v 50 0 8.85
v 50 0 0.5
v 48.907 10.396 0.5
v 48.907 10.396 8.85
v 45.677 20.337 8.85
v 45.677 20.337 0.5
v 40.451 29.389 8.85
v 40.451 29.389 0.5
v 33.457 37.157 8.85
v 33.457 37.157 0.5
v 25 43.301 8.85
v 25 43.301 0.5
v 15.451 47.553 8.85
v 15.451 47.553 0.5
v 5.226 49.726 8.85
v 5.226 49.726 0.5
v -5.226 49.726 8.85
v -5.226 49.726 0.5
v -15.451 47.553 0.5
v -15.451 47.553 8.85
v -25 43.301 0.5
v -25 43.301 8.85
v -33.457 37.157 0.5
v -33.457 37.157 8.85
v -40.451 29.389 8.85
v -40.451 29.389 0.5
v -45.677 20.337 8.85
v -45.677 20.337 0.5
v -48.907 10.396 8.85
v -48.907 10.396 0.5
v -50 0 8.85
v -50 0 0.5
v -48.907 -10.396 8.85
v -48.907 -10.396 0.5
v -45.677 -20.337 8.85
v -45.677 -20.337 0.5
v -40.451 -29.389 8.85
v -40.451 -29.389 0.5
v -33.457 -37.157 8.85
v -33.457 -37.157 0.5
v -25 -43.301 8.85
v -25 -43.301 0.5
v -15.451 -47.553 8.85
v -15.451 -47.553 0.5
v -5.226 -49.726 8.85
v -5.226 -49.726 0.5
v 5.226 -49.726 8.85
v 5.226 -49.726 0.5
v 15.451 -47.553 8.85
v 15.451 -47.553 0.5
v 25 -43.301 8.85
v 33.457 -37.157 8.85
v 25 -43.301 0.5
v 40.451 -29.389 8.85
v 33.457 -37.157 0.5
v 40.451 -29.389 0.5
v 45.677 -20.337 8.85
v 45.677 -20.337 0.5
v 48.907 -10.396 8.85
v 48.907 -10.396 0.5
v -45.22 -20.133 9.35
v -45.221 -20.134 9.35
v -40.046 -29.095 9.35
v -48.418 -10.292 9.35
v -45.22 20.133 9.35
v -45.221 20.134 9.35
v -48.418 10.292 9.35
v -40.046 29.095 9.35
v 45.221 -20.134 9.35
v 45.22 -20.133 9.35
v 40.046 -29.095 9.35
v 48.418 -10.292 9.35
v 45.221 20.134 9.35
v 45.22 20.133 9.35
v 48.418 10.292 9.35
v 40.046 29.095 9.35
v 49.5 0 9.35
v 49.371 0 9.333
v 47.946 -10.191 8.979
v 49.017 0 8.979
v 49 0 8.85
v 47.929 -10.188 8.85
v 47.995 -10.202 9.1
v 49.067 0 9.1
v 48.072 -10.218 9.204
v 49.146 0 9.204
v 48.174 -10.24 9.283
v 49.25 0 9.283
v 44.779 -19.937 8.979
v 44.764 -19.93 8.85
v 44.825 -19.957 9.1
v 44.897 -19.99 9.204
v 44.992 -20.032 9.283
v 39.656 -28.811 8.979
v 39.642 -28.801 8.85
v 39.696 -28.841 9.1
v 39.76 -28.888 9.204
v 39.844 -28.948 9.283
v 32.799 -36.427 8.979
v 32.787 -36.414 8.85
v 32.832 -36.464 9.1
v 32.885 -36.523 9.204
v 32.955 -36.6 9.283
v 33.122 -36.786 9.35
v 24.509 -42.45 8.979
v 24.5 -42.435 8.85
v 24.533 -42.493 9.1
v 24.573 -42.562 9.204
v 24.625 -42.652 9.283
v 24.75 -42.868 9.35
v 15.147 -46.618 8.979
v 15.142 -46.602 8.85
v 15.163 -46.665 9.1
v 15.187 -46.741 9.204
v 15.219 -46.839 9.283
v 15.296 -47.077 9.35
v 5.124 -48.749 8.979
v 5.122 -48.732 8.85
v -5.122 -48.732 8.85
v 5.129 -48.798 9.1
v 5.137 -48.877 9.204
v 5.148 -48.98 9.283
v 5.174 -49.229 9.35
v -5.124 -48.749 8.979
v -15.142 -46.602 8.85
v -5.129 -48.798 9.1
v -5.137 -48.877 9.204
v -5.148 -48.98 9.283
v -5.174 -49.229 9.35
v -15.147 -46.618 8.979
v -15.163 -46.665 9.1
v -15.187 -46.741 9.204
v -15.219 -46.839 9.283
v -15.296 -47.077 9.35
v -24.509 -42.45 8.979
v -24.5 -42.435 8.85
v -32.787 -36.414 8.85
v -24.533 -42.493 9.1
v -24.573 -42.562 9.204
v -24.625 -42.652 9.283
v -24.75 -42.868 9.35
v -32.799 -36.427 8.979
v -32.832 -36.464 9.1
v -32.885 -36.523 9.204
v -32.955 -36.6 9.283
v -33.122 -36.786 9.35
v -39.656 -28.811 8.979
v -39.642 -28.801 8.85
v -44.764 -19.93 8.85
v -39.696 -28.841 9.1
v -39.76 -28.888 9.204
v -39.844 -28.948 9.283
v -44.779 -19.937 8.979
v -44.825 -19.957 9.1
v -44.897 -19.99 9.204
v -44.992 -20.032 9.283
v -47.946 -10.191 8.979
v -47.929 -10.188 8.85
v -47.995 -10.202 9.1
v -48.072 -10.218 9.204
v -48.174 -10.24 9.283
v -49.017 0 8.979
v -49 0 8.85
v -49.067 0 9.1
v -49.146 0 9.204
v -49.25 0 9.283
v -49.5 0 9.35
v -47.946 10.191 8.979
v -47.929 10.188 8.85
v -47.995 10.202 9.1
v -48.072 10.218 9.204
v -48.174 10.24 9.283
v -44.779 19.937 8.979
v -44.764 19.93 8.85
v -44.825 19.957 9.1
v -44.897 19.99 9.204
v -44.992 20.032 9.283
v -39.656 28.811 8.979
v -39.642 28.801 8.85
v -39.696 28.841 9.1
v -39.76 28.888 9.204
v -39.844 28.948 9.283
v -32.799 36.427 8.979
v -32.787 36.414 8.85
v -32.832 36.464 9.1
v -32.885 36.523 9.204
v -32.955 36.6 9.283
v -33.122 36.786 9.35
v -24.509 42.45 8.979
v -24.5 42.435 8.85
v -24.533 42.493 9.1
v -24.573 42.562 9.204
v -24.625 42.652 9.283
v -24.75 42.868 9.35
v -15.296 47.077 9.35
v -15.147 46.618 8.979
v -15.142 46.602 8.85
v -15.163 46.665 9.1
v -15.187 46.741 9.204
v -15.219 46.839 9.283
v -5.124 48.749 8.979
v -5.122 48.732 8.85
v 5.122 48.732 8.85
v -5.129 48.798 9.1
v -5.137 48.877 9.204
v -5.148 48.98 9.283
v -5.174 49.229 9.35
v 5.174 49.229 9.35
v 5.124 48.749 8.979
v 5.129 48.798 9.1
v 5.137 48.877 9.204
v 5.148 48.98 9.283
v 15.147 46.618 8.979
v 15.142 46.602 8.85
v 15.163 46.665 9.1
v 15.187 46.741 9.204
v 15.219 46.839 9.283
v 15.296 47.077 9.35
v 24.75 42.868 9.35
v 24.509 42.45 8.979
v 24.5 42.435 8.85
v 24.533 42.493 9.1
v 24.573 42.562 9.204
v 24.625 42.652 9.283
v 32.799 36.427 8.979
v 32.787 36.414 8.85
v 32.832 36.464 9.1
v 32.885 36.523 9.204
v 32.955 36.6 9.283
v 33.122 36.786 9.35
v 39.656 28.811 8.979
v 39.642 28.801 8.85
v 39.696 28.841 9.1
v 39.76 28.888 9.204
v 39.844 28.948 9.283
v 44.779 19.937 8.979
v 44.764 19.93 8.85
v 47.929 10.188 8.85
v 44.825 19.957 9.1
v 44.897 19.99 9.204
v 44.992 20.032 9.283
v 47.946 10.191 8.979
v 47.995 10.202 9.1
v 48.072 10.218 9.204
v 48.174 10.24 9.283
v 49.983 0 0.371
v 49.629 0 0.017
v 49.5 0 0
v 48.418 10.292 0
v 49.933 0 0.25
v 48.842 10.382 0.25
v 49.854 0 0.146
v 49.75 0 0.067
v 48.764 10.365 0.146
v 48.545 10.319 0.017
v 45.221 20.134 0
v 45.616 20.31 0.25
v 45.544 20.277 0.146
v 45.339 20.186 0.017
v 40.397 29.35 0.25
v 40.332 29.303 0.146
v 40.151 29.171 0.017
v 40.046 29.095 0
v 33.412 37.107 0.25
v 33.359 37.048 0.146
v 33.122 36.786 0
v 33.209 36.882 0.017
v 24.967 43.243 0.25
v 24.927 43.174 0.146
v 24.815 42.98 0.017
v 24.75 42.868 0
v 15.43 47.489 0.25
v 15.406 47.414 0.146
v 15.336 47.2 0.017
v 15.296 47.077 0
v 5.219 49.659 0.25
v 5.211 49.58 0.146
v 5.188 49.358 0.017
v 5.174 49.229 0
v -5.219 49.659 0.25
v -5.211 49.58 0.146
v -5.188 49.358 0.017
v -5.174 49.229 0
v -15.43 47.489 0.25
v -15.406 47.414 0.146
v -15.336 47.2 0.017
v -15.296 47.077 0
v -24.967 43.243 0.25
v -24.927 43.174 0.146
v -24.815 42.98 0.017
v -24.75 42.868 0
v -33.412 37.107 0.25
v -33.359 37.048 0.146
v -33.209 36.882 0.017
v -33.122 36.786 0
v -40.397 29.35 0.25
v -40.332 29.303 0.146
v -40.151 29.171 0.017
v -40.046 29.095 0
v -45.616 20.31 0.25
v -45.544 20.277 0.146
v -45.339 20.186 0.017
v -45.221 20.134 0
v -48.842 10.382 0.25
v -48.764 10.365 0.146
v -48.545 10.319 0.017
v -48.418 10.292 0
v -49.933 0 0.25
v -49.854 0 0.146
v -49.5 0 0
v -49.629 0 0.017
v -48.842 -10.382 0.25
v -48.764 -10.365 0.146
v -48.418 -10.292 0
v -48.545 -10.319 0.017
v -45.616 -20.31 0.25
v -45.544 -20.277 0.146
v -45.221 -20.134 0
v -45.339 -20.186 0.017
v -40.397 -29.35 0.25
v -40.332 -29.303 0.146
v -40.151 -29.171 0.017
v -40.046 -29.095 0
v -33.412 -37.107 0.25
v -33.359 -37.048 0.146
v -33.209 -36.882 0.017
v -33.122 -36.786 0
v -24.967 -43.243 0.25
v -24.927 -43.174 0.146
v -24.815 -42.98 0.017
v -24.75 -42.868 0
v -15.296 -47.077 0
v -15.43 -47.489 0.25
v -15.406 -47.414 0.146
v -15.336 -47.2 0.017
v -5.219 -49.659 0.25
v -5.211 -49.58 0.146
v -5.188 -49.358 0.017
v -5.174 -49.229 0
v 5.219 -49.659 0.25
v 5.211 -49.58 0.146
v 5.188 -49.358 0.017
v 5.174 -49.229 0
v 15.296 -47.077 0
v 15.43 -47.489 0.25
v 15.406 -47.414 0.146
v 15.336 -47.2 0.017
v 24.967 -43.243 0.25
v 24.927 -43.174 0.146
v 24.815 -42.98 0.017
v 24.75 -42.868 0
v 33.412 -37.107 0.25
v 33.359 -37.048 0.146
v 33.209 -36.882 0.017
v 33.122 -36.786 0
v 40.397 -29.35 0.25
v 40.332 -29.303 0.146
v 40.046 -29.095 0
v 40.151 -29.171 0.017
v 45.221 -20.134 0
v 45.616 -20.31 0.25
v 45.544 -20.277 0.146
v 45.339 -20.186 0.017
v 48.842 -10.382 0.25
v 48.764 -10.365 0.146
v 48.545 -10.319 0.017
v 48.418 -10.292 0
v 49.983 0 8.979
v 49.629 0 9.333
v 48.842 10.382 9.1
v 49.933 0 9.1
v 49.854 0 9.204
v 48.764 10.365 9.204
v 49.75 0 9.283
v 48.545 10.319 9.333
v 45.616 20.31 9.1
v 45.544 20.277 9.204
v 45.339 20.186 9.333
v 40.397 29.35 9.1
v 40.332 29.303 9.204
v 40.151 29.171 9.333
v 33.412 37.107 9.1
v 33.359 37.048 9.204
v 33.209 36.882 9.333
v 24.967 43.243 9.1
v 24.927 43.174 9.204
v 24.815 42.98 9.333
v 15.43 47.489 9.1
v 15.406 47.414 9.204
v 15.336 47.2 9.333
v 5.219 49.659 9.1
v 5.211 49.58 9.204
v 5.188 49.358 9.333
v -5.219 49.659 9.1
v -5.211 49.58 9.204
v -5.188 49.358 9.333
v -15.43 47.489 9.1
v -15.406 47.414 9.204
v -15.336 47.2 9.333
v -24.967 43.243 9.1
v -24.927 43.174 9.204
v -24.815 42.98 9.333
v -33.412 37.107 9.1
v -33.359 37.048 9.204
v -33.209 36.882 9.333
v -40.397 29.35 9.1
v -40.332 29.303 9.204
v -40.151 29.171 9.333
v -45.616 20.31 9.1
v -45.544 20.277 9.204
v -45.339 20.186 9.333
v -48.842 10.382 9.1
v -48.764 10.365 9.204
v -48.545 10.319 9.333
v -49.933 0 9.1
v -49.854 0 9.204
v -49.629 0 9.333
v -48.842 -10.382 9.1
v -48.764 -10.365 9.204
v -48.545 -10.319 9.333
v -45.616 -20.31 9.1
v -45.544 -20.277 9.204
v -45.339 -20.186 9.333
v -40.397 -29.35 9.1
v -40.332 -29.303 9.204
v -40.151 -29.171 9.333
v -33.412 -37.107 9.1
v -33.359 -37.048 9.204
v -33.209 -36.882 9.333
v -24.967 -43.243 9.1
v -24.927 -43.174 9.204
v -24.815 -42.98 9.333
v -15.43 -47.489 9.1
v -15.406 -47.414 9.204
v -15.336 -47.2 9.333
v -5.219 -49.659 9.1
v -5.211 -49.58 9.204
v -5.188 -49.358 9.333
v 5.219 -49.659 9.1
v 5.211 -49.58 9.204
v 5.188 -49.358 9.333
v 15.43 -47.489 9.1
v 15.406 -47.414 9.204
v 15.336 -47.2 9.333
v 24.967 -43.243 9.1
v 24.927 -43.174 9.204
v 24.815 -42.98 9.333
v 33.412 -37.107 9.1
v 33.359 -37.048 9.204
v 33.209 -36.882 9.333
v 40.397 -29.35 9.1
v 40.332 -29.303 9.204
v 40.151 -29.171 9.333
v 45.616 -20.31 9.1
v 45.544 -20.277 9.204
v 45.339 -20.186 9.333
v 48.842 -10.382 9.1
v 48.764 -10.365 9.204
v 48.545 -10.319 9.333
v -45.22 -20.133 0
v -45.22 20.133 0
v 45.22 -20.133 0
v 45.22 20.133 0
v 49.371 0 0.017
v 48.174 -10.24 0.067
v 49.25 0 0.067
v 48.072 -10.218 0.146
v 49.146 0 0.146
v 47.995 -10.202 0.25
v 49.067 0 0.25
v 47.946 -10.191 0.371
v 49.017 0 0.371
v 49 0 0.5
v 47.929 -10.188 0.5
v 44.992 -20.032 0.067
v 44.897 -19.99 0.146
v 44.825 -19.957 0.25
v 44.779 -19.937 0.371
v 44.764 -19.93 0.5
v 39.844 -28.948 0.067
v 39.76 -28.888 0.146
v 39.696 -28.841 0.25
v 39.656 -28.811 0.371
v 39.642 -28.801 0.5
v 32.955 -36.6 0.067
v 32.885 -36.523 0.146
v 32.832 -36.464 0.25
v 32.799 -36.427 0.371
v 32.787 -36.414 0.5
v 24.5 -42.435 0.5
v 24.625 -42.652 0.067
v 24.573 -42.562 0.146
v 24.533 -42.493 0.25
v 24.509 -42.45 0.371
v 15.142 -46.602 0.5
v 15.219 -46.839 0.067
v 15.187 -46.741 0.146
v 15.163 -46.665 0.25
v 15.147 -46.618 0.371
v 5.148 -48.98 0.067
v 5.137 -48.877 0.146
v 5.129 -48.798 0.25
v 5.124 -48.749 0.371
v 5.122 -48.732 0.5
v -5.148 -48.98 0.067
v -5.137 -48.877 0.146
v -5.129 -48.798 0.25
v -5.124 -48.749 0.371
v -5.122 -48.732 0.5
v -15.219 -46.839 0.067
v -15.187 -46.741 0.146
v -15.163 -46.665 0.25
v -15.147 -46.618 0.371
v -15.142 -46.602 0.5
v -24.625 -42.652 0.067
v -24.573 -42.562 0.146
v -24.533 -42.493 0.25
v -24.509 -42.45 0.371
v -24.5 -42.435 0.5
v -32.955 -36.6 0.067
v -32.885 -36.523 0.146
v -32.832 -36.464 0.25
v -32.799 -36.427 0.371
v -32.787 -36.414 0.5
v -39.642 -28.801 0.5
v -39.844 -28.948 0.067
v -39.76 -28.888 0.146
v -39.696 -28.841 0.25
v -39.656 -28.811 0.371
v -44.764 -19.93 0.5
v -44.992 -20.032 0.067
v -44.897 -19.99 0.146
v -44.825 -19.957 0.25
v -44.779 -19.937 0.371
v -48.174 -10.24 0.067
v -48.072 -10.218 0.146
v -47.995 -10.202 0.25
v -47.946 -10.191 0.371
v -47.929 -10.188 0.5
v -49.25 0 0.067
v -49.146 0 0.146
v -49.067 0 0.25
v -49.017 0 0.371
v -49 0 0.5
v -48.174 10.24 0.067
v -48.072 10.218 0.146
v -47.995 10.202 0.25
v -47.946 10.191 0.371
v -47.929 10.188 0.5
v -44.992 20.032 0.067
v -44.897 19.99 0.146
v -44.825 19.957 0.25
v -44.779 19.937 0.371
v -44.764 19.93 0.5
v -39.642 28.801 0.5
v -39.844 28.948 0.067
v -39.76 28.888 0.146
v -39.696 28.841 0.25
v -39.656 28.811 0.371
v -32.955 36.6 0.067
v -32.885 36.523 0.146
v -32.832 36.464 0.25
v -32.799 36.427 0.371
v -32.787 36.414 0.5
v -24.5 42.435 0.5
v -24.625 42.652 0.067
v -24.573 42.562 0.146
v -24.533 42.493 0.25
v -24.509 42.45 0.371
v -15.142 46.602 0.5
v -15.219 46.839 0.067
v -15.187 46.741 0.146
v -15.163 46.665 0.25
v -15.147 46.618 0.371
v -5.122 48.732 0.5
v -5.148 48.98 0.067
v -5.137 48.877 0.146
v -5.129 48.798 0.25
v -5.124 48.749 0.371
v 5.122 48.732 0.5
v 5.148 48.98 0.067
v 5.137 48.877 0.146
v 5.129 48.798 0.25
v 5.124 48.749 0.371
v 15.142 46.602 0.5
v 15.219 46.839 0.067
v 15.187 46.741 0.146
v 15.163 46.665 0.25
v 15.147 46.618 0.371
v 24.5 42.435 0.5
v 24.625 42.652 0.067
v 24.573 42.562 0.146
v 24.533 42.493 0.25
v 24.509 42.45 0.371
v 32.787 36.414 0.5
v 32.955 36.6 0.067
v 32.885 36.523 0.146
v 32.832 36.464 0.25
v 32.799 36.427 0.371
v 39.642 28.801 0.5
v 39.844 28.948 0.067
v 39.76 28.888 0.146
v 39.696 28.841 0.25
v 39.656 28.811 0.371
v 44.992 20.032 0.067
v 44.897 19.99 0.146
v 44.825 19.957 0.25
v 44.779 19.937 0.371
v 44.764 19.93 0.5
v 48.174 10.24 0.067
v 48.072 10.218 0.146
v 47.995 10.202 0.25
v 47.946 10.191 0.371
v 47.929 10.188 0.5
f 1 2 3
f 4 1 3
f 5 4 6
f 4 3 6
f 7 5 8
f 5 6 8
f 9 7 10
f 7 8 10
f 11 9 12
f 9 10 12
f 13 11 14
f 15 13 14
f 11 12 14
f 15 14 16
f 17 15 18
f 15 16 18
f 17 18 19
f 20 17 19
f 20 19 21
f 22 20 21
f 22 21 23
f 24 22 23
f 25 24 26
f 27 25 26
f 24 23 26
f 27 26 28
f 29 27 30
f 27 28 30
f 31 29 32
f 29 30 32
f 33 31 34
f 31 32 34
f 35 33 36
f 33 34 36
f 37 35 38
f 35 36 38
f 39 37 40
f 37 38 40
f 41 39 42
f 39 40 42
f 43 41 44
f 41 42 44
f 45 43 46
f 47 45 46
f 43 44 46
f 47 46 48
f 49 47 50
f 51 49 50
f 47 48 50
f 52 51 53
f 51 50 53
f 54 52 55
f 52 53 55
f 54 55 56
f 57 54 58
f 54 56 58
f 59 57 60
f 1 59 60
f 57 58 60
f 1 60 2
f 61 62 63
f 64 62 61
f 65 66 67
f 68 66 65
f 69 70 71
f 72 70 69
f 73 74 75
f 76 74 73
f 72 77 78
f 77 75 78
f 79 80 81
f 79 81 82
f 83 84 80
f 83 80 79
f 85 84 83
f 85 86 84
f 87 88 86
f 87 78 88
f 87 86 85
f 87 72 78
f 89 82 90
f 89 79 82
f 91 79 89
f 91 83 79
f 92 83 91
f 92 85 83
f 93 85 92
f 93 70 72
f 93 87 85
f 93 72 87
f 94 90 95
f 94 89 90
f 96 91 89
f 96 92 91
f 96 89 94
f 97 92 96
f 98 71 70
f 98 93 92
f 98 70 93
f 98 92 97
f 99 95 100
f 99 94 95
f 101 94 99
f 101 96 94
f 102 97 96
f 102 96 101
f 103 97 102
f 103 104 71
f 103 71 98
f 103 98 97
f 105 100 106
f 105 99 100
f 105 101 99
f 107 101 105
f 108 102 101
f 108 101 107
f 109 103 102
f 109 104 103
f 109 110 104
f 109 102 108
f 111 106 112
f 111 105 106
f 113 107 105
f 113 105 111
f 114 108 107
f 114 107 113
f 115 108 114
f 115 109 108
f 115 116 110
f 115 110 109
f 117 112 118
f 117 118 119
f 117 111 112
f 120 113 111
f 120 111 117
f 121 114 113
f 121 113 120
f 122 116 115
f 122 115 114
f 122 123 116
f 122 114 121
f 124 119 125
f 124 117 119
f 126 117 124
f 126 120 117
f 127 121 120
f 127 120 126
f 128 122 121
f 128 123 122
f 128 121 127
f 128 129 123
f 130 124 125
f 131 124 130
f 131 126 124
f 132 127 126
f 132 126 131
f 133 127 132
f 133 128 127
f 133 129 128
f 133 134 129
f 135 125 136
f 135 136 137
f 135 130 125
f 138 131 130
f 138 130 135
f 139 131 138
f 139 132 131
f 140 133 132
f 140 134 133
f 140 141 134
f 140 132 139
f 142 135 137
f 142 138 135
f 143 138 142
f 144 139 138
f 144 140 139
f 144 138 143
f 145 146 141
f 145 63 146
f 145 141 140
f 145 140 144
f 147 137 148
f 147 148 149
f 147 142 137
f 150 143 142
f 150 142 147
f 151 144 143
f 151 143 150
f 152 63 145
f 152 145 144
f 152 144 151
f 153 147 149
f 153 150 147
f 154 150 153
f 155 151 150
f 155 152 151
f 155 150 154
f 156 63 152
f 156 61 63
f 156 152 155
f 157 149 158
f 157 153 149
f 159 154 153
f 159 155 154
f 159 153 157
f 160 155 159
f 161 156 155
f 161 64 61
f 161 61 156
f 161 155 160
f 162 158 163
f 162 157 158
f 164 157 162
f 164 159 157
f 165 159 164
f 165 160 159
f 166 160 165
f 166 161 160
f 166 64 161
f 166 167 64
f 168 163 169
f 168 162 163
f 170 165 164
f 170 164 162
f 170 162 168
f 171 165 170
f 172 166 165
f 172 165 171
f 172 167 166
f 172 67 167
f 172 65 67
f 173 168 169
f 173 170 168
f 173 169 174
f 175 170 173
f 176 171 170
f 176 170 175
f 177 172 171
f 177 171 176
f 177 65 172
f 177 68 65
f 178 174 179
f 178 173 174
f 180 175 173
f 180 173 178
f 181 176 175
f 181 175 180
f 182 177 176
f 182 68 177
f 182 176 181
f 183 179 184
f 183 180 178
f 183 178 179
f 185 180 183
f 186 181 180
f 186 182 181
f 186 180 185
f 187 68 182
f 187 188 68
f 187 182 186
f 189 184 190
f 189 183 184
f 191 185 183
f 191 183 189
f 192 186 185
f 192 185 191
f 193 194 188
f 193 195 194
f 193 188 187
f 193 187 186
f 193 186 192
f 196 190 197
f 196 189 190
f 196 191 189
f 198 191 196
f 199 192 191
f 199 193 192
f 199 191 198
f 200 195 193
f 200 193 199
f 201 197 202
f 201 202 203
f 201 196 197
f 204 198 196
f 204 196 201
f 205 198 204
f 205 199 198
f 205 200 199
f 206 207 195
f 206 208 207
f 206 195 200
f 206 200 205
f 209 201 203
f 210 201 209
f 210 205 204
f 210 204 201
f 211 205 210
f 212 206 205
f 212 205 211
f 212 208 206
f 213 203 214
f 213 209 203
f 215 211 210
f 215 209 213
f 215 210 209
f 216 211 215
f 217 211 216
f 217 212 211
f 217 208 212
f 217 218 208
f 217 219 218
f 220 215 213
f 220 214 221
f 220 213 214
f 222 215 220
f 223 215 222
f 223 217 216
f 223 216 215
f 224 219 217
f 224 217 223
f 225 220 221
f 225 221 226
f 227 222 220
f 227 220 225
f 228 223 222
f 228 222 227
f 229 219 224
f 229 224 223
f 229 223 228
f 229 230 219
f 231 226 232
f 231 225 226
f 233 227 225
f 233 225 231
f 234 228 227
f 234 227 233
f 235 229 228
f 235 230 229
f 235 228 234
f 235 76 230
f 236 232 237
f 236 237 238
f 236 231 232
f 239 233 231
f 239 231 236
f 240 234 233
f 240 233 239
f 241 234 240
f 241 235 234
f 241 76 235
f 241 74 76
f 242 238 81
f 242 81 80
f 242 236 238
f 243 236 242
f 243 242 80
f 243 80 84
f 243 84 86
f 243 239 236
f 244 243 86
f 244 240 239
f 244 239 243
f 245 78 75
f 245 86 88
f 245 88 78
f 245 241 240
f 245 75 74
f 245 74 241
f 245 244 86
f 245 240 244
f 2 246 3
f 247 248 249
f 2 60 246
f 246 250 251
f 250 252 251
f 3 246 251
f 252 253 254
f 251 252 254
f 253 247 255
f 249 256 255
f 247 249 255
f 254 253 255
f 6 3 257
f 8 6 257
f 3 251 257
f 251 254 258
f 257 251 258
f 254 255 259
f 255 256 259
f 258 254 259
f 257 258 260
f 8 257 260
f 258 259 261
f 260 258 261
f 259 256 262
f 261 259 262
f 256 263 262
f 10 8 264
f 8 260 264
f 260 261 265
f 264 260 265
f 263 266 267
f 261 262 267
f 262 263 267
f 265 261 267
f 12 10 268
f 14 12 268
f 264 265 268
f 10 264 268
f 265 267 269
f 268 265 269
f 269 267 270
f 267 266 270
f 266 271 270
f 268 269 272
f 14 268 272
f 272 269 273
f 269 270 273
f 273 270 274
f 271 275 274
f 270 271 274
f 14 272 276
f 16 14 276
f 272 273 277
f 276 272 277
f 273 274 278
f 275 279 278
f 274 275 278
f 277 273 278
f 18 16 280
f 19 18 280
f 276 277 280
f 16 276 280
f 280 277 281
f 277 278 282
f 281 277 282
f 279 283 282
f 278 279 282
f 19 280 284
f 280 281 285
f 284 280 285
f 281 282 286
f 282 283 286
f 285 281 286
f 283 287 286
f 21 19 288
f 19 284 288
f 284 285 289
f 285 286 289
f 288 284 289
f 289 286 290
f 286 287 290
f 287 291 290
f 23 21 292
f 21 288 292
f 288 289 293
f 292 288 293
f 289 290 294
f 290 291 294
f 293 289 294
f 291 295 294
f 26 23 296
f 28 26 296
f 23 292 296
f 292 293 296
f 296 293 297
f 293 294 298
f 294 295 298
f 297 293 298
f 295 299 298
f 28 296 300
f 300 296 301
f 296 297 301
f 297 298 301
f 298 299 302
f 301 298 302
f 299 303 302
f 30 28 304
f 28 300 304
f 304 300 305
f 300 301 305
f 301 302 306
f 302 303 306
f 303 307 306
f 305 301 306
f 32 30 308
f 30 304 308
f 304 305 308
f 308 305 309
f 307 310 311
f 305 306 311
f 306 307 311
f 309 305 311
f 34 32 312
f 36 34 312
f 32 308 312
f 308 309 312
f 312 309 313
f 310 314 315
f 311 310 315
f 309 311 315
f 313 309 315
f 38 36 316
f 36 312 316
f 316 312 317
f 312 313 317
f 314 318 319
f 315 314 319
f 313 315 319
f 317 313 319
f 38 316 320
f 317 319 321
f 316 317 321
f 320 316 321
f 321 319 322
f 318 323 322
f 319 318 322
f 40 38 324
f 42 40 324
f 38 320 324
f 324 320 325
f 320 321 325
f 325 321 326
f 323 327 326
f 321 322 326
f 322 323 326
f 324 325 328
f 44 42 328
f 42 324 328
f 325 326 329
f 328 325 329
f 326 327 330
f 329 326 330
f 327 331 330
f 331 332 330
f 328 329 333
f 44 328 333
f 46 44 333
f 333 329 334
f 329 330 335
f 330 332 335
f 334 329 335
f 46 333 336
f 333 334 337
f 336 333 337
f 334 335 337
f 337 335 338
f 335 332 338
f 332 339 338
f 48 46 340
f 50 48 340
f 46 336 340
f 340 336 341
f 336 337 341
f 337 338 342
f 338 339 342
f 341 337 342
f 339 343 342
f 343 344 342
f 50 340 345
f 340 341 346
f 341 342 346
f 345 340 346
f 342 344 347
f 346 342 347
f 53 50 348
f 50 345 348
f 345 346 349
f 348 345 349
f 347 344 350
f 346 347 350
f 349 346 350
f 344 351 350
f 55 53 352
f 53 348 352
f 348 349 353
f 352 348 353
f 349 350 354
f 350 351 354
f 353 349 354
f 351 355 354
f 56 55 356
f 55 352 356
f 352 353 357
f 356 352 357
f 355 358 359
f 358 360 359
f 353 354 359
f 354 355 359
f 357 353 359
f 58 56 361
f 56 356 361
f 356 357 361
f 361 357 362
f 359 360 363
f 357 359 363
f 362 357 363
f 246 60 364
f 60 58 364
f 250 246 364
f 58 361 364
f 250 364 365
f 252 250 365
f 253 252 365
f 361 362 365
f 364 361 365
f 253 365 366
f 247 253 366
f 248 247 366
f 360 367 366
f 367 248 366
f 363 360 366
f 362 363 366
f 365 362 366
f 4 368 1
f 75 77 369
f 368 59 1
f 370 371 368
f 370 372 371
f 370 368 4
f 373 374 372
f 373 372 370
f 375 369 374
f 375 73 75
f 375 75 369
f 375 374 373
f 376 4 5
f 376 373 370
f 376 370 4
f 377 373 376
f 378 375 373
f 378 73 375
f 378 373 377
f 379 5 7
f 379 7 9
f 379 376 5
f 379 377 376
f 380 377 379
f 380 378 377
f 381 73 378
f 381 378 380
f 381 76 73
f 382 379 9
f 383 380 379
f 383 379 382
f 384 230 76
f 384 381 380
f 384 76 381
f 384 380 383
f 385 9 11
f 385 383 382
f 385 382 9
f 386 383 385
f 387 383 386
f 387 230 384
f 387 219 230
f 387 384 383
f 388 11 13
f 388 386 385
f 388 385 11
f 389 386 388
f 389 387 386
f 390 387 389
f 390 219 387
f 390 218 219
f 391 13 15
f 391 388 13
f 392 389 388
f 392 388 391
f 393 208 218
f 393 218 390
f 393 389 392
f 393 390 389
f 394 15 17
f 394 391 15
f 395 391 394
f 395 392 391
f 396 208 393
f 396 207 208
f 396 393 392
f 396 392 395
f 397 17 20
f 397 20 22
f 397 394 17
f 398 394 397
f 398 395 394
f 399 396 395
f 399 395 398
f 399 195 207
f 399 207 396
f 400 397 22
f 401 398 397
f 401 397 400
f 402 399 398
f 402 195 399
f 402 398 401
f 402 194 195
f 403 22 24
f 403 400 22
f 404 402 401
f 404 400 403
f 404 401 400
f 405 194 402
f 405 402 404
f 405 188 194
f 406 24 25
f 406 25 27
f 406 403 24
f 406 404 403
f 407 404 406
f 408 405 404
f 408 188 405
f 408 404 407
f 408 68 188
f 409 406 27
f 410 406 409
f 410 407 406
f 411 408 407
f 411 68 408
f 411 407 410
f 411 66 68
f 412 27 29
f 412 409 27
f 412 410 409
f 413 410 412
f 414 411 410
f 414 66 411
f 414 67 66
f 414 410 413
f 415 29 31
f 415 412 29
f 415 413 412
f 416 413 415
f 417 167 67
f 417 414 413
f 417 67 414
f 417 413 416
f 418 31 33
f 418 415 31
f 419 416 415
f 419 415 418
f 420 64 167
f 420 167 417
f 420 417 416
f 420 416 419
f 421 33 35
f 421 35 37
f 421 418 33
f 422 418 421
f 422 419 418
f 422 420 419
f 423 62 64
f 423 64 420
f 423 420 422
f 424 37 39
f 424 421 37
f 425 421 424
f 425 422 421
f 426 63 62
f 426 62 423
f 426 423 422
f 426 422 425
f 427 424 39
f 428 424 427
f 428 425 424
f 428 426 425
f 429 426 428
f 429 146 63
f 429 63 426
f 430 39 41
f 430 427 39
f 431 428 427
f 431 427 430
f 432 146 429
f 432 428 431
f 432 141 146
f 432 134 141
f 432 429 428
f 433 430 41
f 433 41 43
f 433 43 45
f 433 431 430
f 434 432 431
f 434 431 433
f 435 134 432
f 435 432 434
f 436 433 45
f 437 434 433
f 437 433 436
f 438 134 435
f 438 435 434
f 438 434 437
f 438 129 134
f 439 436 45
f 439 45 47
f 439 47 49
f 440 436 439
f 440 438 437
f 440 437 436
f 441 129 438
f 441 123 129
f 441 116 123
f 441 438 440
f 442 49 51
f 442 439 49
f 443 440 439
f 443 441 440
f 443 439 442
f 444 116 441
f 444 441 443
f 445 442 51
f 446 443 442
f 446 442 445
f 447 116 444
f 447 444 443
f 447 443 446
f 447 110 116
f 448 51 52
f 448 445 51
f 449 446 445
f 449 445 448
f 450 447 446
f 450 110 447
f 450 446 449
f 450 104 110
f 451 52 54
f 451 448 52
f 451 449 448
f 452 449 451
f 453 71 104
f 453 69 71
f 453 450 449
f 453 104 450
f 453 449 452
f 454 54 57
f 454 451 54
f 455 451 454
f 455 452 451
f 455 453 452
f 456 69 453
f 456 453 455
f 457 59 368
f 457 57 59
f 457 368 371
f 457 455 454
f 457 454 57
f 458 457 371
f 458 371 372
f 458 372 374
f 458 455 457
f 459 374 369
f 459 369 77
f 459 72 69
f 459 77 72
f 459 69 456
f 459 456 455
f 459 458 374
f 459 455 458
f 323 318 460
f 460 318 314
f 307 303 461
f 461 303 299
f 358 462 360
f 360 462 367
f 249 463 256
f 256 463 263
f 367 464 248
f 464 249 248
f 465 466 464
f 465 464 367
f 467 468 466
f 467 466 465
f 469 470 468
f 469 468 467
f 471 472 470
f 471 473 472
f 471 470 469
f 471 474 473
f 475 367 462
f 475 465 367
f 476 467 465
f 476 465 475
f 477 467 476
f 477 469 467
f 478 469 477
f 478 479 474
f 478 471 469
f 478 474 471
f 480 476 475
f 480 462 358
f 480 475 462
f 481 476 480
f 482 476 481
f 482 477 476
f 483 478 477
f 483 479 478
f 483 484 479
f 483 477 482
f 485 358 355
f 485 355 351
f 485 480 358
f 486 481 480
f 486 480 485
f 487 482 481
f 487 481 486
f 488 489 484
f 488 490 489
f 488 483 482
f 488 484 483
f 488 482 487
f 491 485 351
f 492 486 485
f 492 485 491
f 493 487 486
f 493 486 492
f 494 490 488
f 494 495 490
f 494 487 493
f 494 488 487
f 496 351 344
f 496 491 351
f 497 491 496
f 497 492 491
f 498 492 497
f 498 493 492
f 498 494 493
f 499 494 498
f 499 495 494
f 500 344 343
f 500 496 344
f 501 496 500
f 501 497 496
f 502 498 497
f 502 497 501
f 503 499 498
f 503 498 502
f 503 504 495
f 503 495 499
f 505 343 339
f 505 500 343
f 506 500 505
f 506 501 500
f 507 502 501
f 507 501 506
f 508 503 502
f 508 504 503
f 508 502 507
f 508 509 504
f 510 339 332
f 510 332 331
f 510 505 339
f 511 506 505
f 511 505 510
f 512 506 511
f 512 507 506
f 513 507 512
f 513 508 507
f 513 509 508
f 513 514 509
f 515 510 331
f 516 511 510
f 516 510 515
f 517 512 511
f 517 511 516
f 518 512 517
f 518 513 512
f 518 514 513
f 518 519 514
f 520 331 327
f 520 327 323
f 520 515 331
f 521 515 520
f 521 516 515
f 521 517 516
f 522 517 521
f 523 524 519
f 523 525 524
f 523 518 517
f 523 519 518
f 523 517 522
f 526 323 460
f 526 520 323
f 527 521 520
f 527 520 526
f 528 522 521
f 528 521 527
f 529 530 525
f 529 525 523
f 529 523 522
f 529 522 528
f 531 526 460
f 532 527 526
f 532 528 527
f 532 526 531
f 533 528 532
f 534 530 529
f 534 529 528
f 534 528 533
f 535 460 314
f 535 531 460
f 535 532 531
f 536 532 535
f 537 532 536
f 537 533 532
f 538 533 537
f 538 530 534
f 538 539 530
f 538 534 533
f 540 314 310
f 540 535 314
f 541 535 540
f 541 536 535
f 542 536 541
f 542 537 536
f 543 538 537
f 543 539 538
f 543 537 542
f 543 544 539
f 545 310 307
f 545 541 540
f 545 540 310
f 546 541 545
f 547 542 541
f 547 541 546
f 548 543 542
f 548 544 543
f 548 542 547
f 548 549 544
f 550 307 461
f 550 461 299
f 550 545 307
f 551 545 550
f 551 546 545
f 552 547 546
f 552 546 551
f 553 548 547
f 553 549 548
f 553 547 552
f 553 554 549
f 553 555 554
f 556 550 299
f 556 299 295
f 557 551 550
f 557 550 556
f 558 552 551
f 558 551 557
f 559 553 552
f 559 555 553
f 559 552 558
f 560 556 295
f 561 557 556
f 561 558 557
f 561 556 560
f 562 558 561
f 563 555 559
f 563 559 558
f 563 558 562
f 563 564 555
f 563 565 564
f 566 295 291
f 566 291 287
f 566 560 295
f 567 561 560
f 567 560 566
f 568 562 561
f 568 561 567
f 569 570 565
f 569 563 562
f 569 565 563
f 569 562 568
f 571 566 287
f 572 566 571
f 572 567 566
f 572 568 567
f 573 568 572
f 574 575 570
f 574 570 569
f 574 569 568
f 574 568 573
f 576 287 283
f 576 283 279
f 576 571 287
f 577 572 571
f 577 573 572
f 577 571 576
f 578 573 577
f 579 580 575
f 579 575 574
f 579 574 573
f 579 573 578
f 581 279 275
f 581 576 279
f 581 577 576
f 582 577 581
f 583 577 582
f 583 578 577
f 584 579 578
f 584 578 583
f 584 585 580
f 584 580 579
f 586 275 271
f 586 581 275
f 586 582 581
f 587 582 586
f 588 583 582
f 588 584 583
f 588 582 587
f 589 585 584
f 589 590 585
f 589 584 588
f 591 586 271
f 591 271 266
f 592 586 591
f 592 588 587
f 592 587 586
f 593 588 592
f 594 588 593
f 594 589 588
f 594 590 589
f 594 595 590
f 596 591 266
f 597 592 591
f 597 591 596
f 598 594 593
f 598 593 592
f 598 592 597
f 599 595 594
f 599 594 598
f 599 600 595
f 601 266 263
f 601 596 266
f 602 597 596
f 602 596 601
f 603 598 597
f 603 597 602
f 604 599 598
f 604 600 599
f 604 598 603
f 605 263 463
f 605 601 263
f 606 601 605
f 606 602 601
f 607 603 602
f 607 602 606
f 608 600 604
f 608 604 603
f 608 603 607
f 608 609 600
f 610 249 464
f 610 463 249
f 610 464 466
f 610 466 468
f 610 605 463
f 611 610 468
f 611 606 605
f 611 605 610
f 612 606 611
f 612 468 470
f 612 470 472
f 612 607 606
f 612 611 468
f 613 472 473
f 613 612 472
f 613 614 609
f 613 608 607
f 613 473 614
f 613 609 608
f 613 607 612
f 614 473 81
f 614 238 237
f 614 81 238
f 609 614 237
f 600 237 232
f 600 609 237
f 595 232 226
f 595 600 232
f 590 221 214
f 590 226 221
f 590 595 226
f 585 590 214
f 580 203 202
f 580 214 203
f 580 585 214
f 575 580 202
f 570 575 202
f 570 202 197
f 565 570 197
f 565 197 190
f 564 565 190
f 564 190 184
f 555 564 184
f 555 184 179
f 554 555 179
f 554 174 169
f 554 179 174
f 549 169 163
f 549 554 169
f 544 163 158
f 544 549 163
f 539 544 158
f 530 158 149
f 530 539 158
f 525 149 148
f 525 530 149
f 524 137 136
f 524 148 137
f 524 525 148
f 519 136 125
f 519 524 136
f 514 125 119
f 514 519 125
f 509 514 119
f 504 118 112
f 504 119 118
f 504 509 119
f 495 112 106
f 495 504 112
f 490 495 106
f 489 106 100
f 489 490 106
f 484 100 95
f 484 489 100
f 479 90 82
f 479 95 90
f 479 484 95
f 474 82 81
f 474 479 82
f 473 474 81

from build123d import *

# Parameters (mm, degrees)
ESQUISSE1_R        = 50
BOSS_EXTRU_1_DEPTH = 9.35
COQUE1_T           = -1
CONG_1_R           = 0.5


with BuildPart() as part:
    # Esquisse1 → Boss.-Extru.1 (new body)
    with BuildSketch(Plane.XY):
        Circle(ESQUISSE1_R)
    extrude(amount=BOSS_EXTRU_1_DEPTH)

    # Coque1
    coque1_openings = [part.faces().sort_by_distance(p)[0] for p in [
        (0, 0, 9.35),
        (0, 0, 0),
    ]]
    offset(amount=COQUE1_T, openings=coque1_openings, kind=Kind.INTERSECTION)

    # Congé1
    cong_1_edges = [part.edges().sort_by_distance(p)[0] for p in [
        (-50, 0, 0),
        (-50, 0, 9.35),
        (-49, 0, 0),
        (-49, 0, 9.35),
    ]]
    fillet(cong_1_edges, radius=CONG_1_R - 0.0001)  # a hair under: the kernel refuses the full size


solid = part.part
